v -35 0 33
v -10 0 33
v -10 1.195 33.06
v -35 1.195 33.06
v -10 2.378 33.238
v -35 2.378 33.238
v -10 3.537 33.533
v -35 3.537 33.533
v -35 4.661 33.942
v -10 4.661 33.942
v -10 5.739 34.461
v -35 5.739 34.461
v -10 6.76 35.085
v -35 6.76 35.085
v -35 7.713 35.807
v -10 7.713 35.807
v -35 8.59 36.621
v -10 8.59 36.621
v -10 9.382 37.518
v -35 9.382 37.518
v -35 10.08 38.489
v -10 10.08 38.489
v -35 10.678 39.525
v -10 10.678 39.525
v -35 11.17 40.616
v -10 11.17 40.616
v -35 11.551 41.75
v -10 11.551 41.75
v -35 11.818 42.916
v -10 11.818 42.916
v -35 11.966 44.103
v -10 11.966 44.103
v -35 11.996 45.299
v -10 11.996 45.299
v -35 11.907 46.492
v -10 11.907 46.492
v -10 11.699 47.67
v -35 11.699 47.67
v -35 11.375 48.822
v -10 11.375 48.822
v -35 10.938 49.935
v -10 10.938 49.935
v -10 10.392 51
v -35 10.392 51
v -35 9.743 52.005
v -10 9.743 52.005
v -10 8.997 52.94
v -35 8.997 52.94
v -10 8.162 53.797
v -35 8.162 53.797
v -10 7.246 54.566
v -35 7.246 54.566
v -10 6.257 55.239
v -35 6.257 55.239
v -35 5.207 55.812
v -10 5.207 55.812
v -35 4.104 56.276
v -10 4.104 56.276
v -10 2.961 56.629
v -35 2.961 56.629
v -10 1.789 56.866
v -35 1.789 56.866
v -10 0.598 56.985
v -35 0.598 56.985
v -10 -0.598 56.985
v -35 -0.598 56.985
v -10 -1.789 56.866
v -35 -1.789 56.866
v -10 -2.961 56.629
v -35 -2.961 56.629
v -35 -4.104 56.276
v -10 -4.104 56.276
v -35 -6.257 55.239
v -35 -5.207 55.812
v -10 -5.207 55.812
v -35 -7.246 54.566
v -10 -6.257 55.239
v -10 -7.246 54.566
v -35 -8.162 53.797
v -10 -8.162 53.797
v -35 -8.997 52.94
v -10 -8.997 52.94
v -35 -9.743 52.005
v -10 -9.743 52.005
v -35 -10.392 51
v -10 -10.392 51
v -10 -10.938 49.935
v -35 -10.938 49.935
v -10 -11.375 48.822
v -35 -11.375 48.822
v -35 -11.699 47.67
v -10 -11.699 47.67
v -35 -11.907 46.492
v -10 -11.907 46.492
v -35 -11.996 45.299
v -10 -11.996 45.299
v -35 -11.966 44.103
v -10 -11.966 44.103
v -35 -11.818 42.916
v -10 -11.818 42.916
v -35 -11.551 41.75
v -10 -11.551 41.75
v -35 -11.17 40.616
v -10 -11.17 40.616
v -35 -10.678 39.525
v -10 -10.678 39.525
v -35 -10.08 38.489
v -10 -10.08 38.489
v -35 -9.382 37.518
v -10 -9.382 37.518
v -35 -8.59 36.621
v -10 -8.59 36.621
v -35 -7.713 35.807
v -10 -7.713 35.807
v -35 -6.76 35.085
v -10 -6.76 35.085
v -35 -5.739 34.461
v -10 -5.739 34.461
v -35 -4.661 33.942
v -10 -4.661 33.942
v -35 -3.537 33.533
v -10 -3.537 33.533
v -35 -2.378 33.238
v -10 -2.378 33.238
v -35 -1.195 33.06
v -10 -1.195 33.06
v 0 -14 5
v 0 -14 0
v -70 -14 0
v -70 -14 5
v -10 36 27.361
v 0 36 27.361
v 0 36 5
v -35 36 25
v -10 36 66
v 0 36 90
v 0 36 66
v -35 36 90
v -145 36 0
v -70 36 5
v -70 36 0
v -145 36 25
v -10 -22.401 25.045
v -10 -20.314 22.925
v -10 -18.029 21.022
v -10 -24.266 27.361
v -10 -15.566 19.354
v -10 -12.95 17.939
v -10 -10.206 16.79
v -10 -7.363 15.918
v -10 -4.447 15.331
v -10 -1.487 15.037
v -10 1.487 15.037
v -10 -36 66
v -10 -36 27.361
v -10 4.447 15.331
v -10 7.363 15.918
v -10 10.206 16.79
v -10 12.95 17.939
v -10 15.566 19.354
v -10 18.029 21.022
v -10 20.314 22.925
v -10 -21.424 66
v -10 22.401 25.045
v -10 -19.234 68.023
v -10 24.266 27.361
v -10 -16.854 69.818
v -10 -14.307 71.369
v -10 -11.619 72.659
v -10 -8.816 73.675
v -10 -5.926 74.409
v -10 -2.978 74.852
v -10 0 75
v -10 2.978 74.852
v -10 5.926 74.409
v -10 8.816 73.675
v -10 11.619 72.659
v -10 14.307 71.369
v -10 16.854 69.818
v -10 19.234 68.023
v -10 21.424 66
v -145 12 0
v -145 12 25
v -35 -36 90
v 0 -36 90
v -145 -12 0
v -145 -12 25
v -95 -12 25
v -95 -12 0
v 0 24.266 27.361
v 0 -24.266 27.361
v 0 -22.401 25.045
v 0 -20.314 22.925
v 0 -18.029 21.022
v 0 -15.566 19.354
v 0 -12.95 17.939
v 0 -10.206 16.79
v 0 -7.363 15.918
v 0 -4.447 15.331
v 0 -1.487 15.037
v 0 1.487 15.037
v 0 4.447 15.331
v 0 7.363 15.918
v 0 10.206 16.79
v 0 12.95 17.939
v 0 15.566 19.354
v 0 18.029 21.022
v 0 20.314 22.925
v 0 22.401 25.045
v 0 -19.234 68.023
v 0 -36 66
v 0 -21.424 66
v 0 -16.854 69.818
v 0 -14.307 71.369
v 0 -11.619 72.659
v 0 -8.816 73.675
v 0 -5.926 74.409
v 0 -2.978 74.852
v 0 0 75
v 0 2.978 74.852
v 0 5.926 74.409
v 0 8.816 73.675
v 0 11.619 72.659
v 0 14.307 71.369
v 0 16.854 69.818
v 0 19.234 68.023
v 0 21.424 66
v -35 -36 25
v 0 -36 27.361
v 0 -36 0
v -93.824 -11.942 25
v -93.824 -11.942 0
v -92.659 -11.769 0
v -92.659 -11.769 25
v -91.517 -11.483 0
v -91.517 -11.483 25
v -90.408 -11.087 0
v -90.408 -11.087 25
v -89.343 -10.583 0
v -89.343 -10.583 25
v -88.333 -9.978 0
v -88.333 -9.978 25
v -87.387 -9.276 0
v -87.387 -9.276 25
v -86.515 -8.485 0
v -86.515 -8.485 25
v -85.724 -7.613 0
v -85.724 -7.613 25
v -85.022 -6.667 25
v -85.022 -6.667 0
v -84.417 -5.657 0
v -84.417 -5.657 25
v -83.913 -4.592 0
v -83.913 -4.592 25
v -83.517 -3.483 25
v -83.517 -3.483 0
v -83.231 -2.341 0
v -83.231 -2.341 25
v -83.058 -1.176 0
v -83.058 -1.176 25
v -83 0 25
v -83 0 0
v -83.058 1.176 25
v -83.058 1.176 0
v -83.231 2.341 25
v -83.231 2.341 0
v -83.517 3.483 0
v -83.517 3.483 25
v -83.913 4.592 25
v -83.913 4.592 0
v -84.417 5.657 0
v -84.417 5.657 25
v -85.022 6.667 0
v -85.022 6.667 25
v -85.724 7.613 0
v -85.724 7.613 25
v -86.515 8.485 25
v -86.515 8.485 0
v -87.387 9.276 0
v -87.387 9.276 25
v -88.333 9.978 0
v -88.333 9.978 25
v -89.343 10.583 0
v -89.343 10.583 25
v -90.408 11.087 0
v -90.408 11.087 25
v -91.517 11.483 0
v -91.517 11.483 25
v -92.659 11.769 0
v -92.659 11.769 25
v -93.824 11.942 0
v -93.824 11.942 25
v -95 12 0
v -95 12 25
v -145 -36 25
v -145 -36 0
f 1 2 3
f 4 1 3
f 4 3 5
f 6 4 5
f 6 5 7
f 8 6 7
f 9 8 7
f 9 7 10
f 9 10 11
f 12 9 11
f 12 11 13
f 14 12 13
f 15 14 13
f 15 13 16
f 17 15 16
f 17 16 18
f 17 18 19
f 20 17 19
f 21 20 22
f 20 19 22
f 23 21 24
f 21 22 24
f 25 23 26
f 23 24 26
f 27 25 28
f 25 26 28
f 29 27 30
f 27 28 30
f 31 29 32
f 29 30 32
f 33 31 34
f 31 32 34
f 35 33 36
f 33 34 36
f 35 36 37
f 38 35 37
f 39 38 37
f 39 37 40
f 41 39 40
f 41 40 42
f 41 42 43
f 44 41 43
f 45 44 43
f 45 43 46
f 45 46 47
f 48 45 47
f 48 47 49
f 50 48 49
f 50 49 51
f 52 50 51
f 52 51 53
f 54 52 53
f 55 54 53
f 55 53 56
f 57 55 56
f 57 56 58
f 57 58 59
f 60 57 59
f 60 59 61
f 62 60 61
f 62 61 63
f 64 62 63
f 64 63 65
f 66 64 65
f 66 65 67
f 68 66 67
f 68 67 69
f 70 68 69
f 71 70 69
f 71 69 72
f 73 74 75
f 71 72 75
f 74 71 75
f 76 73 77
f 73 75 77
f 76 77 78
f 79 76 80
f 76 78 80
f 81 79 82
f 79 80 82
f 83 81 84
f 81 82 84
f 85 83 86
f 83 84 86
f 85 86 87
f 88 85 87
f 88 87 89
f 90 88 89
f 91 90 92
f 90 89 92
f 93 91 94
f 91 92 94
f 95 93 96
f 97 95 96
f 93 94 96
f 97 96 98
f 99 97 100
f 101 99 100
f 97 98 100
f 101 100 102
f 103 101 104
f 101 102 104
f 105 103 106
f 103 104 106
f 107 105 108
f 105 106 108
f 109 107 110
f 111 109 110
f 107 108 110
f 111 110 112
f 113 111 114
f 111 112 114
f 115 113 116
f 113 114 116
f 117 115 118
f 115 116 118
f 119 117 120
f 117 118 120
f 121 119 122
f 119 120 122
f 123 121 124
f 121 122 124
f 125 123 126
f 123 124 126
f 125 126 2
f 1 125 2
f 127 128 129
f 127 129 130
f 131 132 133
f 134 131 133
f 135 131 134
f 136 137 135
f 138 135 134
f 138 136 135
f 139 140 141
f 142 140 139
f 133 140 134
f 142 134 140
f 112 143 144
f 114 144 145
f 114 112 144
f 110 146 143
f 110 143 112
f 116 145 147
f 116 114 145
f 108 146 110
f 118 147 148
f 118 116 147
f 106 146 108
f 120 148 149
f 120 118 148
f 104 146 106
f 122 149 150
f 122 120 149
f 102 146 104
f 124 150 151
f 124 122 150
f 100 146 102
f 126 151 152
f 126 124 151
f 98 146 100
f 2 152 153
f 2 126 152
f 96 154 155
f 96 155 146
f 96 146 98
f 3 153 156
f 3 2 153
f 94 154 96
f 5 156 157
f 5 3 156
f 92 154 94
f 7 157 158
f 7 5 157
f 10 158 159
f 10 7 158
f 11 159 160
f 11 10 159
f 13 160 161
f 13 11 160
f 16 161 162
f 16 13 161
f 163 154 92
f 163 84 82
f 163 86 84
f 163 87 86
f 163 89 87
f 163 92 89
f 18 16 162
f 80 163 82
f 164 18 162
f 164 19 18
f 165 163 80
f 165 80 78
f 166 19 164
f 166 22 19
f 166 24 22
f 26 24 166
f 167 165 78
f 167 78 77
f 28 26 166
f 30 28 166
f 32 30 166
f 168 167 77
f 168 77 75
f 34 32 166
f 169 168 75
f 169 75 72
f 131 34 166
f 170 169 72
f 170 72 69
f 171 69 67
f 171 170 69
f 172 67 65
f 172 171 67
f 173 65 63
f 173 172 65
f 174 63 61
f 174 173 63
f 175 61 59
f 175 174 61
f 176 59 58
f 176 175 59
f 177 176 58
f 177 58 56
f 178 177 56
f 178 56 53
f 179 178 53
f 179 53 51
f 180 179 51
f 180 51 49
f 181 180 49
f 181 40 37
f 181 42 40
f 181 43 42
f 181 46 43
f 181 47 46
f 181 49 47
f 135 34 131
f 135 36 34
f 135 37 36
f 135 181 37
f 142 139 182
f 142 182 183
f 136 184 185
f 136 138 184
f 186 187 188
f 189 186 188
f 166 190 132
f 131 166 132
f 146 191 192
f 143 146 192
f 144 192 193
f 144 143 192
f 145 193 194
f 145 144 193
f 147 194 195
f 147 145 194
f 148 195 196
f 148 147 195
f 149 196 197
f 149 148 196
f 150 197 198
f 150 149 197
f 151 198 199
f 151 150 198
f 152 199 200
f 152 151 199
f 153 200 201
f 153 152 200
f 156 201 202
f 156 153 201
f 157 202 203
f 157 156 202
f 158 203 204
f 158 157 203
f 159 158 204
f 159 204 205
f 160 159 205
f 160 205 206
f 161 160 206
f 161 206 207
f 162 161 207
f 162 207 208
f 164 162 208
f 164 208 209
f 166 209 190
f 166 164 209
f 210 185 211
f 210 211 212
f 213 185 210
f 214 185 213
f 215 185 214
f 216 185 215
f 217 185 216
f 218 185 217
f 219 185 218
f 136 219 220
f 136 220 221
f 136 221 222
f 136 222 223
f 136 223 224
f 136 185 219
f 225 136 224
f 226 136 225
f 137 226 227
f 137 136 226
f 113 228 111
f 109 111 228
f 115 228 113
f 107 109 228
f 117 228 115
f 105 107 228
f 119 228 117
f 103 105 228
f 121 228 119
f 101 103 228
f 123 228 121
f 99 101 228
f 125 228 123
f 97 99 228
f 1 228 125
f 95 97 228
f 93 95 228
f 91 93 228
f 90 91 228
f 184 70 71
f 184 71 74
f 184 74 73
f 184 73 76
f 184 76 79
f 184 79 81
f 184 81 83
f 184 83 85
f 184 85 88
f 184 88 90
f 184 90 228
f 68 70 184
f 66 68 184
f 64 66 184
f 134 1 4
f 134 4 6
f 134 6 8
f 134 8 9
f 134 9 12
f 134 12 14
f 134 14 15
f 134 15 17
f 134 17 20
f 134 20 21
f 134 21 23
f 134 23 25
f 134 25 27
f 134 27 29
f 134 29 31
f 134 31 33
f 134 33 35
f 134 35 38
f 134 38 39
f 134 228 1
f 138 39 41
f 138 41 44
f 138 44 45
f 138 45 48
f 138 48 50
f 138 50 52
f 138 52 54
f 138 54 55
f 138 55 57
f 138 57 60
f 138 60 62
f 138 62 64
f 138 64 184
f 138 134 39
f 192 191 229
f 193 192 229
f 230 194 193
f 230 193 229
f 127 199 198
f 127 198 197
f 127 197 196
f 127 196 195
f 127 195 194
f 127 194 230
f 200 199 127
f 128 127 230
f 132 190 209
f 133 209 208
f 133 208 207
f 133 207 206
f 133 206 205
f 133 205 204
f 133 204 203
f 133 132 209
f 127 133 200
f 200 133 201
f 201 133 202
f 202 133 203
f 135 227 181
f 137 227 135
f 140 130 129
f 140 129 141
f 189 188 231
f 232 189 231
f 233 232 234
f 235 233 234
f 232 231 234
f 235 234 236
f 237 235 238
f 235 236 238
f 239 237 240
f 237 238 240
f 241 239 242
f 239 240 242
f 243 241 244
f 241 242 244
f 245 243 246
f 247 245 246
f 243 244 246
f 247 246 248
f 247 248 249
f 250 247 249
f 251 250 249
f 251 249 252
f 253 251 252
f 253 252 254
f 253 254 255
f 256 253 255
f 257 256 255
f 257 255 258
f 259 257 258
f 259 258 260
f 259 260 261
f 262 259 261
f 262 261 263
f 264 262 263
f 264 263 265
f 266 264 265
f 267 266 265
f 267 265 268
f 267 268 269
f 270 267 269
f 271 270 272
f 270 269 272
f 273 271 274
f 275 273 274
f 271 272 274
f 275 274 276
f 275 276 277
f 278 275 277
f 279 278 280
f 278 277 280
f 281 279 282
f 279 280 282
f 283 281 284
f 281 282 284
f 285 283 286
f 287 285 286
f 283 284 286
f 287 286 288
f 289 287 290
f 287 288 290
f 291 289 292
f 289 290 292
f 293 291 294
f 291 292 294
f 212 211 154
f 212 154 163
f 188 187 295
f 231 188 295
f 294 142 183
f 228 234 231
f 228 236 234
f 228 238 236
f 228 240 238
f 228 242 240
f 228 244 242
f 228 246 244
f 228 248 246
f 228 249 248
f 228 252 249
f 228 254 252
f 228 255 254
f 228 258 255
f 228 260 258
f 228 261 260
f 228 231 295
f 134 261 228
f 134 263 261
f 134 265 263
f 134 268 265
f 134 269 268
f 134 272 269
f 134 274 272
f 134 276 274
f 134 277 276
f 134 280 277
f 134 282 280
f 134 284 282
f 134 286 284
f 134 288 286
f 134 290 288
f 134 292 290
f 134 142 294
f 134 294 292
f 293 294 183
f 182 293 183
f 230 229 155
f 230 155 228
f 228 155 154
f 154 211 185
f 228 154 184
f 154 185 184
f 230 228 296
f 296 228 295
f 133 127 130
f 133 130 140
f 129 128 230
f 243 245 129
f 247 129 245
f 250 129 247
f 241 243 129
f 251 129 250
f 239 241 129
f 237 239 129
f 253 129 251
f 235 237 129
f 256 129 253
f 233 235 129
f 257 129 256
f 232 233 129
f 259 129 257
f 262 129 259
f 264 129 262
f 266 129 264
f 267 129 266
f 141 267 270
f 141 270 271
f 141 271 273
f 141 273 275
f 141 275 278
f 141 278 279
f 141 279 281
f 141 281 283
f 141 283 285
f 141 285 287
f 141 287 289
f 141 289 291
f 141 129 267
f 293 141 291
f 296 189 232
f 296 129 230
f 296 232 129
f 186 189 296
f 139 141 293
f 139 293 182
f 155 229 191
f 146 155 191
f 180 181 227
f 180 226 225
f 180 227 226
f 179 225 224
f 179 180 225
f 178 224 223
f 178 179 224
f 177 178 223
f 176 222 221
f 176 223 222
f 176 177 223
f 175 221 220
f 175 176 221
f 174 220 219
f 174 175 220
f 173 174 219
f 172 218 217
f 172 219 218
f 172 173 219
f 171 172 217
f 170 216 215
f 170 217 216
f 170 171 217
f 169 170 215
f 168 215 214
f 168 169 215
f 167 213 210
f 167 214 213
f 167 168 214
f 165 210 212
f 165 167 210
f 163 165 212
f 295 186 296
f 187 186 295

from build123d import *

# Parameters (mm, degrees)
BOSS_EXTRUDE1_DEPTH     = 36
CUT_EXTRUDE1_DEPTH      = 175.416168975
CUT_EXTRUDE1_DEPTH_BACK = 10
SKETCH2_R               = 30
SKETCH3_W               = 72
SKETCH3_H               = 38.639129372
CUT_EXTRUDE2_DEPTH      = 10
SKETCH4_R               = 12
CUT_EXTRUDE3_DEPTH      = 167.195667814
SKETCH5_W               = 50
SKETCH5_H               = 5
CUT_EXTRUDE4_DEPTH      = 70
CUT_EXTRUDE5_DEPTH      = 70


with BuildPart() as part:
    # Sketch1 → Boss-Extrude1 (new, symmetric)
    with BuildSketch(Plane(origin=(0, 0, 0), x_dir=(-1, 0, 0), z_dir=(0, 1, 0))):
        Polygon((0, 0), (145, 0), (145, 25), (35, 25), (35, 90), (0, 90), align=None)
    extrude(amount=BOSS_EXTRUDE1_DEPTH, both=True)

    # Sketch2 → Cut-Extrude1 (cut, two sides: drawn at the far end of the back side and taken through both)
    with BuildSketch(Plane.YZ.offset(-CUT_EXTRUDE1_DEPTH_BACK)):
        with Locations(Location((0, 45, 0), (0, 0, 90))):
            Circle(SKETCH2_R)
    extrude(amount=CUT_EXTRUDE1_DEPTH + CUT_EXTRUDE1_DEPTH_BACK, mode=Mode.SUBTRACT)

    # Sketch3 → Cut-Extrude2 (cut)
    with BuildSketch(Plane.YZ):
        with Locations((0, 46.680435314)):
            Rectangle(SKETCH3_W, SKETCH3_H)
    extrude(amount=-CUT_EXTRUDE2_DEPTH, mode=Mode.SUBTRACT)

    # Sketch4 → Cut-Extrude3 (cut, through all)
    with BuildSketch(Plane.YZ.offset(-10)):
        with Locations(Location((0, 45, 0), (0, 0, 270))):
            Circle(SKETCH4_R)
    extrude(amount=-CUT_EXTRUDE3_DEPTH, mode=Mode.SUBTRACT)

    # Sketch5 → Cut-Extrude4 (cut)
    with BuildSketch(Plane.YZ):
        with Locations((11, 2.5)):
            Rectangle(SKETCH5_W, SKETCH5_H)
    extrude(amount=-CUT_EXTRUDE4_DEPTH, mode=Mode.SUBTRACT)

    # Sketch6 → Cut-Extrude5 (cut)
    with BuildSketch(Plane.XY.offset(25)):
        with BuildLine():
            Line((-95, 12), (-145, 12))
            Line((-145, 12), (-145, -12))
            Line((-145, -12), (-95, -12))
            ThreePointArc((-95, -12), (-83, 0), (-95, 12))
        make_face()
    extrude(amount=-CUT_EXTRUDE5_DEPTH, mode=Mode.SUBTRACT)


solid = part.part
